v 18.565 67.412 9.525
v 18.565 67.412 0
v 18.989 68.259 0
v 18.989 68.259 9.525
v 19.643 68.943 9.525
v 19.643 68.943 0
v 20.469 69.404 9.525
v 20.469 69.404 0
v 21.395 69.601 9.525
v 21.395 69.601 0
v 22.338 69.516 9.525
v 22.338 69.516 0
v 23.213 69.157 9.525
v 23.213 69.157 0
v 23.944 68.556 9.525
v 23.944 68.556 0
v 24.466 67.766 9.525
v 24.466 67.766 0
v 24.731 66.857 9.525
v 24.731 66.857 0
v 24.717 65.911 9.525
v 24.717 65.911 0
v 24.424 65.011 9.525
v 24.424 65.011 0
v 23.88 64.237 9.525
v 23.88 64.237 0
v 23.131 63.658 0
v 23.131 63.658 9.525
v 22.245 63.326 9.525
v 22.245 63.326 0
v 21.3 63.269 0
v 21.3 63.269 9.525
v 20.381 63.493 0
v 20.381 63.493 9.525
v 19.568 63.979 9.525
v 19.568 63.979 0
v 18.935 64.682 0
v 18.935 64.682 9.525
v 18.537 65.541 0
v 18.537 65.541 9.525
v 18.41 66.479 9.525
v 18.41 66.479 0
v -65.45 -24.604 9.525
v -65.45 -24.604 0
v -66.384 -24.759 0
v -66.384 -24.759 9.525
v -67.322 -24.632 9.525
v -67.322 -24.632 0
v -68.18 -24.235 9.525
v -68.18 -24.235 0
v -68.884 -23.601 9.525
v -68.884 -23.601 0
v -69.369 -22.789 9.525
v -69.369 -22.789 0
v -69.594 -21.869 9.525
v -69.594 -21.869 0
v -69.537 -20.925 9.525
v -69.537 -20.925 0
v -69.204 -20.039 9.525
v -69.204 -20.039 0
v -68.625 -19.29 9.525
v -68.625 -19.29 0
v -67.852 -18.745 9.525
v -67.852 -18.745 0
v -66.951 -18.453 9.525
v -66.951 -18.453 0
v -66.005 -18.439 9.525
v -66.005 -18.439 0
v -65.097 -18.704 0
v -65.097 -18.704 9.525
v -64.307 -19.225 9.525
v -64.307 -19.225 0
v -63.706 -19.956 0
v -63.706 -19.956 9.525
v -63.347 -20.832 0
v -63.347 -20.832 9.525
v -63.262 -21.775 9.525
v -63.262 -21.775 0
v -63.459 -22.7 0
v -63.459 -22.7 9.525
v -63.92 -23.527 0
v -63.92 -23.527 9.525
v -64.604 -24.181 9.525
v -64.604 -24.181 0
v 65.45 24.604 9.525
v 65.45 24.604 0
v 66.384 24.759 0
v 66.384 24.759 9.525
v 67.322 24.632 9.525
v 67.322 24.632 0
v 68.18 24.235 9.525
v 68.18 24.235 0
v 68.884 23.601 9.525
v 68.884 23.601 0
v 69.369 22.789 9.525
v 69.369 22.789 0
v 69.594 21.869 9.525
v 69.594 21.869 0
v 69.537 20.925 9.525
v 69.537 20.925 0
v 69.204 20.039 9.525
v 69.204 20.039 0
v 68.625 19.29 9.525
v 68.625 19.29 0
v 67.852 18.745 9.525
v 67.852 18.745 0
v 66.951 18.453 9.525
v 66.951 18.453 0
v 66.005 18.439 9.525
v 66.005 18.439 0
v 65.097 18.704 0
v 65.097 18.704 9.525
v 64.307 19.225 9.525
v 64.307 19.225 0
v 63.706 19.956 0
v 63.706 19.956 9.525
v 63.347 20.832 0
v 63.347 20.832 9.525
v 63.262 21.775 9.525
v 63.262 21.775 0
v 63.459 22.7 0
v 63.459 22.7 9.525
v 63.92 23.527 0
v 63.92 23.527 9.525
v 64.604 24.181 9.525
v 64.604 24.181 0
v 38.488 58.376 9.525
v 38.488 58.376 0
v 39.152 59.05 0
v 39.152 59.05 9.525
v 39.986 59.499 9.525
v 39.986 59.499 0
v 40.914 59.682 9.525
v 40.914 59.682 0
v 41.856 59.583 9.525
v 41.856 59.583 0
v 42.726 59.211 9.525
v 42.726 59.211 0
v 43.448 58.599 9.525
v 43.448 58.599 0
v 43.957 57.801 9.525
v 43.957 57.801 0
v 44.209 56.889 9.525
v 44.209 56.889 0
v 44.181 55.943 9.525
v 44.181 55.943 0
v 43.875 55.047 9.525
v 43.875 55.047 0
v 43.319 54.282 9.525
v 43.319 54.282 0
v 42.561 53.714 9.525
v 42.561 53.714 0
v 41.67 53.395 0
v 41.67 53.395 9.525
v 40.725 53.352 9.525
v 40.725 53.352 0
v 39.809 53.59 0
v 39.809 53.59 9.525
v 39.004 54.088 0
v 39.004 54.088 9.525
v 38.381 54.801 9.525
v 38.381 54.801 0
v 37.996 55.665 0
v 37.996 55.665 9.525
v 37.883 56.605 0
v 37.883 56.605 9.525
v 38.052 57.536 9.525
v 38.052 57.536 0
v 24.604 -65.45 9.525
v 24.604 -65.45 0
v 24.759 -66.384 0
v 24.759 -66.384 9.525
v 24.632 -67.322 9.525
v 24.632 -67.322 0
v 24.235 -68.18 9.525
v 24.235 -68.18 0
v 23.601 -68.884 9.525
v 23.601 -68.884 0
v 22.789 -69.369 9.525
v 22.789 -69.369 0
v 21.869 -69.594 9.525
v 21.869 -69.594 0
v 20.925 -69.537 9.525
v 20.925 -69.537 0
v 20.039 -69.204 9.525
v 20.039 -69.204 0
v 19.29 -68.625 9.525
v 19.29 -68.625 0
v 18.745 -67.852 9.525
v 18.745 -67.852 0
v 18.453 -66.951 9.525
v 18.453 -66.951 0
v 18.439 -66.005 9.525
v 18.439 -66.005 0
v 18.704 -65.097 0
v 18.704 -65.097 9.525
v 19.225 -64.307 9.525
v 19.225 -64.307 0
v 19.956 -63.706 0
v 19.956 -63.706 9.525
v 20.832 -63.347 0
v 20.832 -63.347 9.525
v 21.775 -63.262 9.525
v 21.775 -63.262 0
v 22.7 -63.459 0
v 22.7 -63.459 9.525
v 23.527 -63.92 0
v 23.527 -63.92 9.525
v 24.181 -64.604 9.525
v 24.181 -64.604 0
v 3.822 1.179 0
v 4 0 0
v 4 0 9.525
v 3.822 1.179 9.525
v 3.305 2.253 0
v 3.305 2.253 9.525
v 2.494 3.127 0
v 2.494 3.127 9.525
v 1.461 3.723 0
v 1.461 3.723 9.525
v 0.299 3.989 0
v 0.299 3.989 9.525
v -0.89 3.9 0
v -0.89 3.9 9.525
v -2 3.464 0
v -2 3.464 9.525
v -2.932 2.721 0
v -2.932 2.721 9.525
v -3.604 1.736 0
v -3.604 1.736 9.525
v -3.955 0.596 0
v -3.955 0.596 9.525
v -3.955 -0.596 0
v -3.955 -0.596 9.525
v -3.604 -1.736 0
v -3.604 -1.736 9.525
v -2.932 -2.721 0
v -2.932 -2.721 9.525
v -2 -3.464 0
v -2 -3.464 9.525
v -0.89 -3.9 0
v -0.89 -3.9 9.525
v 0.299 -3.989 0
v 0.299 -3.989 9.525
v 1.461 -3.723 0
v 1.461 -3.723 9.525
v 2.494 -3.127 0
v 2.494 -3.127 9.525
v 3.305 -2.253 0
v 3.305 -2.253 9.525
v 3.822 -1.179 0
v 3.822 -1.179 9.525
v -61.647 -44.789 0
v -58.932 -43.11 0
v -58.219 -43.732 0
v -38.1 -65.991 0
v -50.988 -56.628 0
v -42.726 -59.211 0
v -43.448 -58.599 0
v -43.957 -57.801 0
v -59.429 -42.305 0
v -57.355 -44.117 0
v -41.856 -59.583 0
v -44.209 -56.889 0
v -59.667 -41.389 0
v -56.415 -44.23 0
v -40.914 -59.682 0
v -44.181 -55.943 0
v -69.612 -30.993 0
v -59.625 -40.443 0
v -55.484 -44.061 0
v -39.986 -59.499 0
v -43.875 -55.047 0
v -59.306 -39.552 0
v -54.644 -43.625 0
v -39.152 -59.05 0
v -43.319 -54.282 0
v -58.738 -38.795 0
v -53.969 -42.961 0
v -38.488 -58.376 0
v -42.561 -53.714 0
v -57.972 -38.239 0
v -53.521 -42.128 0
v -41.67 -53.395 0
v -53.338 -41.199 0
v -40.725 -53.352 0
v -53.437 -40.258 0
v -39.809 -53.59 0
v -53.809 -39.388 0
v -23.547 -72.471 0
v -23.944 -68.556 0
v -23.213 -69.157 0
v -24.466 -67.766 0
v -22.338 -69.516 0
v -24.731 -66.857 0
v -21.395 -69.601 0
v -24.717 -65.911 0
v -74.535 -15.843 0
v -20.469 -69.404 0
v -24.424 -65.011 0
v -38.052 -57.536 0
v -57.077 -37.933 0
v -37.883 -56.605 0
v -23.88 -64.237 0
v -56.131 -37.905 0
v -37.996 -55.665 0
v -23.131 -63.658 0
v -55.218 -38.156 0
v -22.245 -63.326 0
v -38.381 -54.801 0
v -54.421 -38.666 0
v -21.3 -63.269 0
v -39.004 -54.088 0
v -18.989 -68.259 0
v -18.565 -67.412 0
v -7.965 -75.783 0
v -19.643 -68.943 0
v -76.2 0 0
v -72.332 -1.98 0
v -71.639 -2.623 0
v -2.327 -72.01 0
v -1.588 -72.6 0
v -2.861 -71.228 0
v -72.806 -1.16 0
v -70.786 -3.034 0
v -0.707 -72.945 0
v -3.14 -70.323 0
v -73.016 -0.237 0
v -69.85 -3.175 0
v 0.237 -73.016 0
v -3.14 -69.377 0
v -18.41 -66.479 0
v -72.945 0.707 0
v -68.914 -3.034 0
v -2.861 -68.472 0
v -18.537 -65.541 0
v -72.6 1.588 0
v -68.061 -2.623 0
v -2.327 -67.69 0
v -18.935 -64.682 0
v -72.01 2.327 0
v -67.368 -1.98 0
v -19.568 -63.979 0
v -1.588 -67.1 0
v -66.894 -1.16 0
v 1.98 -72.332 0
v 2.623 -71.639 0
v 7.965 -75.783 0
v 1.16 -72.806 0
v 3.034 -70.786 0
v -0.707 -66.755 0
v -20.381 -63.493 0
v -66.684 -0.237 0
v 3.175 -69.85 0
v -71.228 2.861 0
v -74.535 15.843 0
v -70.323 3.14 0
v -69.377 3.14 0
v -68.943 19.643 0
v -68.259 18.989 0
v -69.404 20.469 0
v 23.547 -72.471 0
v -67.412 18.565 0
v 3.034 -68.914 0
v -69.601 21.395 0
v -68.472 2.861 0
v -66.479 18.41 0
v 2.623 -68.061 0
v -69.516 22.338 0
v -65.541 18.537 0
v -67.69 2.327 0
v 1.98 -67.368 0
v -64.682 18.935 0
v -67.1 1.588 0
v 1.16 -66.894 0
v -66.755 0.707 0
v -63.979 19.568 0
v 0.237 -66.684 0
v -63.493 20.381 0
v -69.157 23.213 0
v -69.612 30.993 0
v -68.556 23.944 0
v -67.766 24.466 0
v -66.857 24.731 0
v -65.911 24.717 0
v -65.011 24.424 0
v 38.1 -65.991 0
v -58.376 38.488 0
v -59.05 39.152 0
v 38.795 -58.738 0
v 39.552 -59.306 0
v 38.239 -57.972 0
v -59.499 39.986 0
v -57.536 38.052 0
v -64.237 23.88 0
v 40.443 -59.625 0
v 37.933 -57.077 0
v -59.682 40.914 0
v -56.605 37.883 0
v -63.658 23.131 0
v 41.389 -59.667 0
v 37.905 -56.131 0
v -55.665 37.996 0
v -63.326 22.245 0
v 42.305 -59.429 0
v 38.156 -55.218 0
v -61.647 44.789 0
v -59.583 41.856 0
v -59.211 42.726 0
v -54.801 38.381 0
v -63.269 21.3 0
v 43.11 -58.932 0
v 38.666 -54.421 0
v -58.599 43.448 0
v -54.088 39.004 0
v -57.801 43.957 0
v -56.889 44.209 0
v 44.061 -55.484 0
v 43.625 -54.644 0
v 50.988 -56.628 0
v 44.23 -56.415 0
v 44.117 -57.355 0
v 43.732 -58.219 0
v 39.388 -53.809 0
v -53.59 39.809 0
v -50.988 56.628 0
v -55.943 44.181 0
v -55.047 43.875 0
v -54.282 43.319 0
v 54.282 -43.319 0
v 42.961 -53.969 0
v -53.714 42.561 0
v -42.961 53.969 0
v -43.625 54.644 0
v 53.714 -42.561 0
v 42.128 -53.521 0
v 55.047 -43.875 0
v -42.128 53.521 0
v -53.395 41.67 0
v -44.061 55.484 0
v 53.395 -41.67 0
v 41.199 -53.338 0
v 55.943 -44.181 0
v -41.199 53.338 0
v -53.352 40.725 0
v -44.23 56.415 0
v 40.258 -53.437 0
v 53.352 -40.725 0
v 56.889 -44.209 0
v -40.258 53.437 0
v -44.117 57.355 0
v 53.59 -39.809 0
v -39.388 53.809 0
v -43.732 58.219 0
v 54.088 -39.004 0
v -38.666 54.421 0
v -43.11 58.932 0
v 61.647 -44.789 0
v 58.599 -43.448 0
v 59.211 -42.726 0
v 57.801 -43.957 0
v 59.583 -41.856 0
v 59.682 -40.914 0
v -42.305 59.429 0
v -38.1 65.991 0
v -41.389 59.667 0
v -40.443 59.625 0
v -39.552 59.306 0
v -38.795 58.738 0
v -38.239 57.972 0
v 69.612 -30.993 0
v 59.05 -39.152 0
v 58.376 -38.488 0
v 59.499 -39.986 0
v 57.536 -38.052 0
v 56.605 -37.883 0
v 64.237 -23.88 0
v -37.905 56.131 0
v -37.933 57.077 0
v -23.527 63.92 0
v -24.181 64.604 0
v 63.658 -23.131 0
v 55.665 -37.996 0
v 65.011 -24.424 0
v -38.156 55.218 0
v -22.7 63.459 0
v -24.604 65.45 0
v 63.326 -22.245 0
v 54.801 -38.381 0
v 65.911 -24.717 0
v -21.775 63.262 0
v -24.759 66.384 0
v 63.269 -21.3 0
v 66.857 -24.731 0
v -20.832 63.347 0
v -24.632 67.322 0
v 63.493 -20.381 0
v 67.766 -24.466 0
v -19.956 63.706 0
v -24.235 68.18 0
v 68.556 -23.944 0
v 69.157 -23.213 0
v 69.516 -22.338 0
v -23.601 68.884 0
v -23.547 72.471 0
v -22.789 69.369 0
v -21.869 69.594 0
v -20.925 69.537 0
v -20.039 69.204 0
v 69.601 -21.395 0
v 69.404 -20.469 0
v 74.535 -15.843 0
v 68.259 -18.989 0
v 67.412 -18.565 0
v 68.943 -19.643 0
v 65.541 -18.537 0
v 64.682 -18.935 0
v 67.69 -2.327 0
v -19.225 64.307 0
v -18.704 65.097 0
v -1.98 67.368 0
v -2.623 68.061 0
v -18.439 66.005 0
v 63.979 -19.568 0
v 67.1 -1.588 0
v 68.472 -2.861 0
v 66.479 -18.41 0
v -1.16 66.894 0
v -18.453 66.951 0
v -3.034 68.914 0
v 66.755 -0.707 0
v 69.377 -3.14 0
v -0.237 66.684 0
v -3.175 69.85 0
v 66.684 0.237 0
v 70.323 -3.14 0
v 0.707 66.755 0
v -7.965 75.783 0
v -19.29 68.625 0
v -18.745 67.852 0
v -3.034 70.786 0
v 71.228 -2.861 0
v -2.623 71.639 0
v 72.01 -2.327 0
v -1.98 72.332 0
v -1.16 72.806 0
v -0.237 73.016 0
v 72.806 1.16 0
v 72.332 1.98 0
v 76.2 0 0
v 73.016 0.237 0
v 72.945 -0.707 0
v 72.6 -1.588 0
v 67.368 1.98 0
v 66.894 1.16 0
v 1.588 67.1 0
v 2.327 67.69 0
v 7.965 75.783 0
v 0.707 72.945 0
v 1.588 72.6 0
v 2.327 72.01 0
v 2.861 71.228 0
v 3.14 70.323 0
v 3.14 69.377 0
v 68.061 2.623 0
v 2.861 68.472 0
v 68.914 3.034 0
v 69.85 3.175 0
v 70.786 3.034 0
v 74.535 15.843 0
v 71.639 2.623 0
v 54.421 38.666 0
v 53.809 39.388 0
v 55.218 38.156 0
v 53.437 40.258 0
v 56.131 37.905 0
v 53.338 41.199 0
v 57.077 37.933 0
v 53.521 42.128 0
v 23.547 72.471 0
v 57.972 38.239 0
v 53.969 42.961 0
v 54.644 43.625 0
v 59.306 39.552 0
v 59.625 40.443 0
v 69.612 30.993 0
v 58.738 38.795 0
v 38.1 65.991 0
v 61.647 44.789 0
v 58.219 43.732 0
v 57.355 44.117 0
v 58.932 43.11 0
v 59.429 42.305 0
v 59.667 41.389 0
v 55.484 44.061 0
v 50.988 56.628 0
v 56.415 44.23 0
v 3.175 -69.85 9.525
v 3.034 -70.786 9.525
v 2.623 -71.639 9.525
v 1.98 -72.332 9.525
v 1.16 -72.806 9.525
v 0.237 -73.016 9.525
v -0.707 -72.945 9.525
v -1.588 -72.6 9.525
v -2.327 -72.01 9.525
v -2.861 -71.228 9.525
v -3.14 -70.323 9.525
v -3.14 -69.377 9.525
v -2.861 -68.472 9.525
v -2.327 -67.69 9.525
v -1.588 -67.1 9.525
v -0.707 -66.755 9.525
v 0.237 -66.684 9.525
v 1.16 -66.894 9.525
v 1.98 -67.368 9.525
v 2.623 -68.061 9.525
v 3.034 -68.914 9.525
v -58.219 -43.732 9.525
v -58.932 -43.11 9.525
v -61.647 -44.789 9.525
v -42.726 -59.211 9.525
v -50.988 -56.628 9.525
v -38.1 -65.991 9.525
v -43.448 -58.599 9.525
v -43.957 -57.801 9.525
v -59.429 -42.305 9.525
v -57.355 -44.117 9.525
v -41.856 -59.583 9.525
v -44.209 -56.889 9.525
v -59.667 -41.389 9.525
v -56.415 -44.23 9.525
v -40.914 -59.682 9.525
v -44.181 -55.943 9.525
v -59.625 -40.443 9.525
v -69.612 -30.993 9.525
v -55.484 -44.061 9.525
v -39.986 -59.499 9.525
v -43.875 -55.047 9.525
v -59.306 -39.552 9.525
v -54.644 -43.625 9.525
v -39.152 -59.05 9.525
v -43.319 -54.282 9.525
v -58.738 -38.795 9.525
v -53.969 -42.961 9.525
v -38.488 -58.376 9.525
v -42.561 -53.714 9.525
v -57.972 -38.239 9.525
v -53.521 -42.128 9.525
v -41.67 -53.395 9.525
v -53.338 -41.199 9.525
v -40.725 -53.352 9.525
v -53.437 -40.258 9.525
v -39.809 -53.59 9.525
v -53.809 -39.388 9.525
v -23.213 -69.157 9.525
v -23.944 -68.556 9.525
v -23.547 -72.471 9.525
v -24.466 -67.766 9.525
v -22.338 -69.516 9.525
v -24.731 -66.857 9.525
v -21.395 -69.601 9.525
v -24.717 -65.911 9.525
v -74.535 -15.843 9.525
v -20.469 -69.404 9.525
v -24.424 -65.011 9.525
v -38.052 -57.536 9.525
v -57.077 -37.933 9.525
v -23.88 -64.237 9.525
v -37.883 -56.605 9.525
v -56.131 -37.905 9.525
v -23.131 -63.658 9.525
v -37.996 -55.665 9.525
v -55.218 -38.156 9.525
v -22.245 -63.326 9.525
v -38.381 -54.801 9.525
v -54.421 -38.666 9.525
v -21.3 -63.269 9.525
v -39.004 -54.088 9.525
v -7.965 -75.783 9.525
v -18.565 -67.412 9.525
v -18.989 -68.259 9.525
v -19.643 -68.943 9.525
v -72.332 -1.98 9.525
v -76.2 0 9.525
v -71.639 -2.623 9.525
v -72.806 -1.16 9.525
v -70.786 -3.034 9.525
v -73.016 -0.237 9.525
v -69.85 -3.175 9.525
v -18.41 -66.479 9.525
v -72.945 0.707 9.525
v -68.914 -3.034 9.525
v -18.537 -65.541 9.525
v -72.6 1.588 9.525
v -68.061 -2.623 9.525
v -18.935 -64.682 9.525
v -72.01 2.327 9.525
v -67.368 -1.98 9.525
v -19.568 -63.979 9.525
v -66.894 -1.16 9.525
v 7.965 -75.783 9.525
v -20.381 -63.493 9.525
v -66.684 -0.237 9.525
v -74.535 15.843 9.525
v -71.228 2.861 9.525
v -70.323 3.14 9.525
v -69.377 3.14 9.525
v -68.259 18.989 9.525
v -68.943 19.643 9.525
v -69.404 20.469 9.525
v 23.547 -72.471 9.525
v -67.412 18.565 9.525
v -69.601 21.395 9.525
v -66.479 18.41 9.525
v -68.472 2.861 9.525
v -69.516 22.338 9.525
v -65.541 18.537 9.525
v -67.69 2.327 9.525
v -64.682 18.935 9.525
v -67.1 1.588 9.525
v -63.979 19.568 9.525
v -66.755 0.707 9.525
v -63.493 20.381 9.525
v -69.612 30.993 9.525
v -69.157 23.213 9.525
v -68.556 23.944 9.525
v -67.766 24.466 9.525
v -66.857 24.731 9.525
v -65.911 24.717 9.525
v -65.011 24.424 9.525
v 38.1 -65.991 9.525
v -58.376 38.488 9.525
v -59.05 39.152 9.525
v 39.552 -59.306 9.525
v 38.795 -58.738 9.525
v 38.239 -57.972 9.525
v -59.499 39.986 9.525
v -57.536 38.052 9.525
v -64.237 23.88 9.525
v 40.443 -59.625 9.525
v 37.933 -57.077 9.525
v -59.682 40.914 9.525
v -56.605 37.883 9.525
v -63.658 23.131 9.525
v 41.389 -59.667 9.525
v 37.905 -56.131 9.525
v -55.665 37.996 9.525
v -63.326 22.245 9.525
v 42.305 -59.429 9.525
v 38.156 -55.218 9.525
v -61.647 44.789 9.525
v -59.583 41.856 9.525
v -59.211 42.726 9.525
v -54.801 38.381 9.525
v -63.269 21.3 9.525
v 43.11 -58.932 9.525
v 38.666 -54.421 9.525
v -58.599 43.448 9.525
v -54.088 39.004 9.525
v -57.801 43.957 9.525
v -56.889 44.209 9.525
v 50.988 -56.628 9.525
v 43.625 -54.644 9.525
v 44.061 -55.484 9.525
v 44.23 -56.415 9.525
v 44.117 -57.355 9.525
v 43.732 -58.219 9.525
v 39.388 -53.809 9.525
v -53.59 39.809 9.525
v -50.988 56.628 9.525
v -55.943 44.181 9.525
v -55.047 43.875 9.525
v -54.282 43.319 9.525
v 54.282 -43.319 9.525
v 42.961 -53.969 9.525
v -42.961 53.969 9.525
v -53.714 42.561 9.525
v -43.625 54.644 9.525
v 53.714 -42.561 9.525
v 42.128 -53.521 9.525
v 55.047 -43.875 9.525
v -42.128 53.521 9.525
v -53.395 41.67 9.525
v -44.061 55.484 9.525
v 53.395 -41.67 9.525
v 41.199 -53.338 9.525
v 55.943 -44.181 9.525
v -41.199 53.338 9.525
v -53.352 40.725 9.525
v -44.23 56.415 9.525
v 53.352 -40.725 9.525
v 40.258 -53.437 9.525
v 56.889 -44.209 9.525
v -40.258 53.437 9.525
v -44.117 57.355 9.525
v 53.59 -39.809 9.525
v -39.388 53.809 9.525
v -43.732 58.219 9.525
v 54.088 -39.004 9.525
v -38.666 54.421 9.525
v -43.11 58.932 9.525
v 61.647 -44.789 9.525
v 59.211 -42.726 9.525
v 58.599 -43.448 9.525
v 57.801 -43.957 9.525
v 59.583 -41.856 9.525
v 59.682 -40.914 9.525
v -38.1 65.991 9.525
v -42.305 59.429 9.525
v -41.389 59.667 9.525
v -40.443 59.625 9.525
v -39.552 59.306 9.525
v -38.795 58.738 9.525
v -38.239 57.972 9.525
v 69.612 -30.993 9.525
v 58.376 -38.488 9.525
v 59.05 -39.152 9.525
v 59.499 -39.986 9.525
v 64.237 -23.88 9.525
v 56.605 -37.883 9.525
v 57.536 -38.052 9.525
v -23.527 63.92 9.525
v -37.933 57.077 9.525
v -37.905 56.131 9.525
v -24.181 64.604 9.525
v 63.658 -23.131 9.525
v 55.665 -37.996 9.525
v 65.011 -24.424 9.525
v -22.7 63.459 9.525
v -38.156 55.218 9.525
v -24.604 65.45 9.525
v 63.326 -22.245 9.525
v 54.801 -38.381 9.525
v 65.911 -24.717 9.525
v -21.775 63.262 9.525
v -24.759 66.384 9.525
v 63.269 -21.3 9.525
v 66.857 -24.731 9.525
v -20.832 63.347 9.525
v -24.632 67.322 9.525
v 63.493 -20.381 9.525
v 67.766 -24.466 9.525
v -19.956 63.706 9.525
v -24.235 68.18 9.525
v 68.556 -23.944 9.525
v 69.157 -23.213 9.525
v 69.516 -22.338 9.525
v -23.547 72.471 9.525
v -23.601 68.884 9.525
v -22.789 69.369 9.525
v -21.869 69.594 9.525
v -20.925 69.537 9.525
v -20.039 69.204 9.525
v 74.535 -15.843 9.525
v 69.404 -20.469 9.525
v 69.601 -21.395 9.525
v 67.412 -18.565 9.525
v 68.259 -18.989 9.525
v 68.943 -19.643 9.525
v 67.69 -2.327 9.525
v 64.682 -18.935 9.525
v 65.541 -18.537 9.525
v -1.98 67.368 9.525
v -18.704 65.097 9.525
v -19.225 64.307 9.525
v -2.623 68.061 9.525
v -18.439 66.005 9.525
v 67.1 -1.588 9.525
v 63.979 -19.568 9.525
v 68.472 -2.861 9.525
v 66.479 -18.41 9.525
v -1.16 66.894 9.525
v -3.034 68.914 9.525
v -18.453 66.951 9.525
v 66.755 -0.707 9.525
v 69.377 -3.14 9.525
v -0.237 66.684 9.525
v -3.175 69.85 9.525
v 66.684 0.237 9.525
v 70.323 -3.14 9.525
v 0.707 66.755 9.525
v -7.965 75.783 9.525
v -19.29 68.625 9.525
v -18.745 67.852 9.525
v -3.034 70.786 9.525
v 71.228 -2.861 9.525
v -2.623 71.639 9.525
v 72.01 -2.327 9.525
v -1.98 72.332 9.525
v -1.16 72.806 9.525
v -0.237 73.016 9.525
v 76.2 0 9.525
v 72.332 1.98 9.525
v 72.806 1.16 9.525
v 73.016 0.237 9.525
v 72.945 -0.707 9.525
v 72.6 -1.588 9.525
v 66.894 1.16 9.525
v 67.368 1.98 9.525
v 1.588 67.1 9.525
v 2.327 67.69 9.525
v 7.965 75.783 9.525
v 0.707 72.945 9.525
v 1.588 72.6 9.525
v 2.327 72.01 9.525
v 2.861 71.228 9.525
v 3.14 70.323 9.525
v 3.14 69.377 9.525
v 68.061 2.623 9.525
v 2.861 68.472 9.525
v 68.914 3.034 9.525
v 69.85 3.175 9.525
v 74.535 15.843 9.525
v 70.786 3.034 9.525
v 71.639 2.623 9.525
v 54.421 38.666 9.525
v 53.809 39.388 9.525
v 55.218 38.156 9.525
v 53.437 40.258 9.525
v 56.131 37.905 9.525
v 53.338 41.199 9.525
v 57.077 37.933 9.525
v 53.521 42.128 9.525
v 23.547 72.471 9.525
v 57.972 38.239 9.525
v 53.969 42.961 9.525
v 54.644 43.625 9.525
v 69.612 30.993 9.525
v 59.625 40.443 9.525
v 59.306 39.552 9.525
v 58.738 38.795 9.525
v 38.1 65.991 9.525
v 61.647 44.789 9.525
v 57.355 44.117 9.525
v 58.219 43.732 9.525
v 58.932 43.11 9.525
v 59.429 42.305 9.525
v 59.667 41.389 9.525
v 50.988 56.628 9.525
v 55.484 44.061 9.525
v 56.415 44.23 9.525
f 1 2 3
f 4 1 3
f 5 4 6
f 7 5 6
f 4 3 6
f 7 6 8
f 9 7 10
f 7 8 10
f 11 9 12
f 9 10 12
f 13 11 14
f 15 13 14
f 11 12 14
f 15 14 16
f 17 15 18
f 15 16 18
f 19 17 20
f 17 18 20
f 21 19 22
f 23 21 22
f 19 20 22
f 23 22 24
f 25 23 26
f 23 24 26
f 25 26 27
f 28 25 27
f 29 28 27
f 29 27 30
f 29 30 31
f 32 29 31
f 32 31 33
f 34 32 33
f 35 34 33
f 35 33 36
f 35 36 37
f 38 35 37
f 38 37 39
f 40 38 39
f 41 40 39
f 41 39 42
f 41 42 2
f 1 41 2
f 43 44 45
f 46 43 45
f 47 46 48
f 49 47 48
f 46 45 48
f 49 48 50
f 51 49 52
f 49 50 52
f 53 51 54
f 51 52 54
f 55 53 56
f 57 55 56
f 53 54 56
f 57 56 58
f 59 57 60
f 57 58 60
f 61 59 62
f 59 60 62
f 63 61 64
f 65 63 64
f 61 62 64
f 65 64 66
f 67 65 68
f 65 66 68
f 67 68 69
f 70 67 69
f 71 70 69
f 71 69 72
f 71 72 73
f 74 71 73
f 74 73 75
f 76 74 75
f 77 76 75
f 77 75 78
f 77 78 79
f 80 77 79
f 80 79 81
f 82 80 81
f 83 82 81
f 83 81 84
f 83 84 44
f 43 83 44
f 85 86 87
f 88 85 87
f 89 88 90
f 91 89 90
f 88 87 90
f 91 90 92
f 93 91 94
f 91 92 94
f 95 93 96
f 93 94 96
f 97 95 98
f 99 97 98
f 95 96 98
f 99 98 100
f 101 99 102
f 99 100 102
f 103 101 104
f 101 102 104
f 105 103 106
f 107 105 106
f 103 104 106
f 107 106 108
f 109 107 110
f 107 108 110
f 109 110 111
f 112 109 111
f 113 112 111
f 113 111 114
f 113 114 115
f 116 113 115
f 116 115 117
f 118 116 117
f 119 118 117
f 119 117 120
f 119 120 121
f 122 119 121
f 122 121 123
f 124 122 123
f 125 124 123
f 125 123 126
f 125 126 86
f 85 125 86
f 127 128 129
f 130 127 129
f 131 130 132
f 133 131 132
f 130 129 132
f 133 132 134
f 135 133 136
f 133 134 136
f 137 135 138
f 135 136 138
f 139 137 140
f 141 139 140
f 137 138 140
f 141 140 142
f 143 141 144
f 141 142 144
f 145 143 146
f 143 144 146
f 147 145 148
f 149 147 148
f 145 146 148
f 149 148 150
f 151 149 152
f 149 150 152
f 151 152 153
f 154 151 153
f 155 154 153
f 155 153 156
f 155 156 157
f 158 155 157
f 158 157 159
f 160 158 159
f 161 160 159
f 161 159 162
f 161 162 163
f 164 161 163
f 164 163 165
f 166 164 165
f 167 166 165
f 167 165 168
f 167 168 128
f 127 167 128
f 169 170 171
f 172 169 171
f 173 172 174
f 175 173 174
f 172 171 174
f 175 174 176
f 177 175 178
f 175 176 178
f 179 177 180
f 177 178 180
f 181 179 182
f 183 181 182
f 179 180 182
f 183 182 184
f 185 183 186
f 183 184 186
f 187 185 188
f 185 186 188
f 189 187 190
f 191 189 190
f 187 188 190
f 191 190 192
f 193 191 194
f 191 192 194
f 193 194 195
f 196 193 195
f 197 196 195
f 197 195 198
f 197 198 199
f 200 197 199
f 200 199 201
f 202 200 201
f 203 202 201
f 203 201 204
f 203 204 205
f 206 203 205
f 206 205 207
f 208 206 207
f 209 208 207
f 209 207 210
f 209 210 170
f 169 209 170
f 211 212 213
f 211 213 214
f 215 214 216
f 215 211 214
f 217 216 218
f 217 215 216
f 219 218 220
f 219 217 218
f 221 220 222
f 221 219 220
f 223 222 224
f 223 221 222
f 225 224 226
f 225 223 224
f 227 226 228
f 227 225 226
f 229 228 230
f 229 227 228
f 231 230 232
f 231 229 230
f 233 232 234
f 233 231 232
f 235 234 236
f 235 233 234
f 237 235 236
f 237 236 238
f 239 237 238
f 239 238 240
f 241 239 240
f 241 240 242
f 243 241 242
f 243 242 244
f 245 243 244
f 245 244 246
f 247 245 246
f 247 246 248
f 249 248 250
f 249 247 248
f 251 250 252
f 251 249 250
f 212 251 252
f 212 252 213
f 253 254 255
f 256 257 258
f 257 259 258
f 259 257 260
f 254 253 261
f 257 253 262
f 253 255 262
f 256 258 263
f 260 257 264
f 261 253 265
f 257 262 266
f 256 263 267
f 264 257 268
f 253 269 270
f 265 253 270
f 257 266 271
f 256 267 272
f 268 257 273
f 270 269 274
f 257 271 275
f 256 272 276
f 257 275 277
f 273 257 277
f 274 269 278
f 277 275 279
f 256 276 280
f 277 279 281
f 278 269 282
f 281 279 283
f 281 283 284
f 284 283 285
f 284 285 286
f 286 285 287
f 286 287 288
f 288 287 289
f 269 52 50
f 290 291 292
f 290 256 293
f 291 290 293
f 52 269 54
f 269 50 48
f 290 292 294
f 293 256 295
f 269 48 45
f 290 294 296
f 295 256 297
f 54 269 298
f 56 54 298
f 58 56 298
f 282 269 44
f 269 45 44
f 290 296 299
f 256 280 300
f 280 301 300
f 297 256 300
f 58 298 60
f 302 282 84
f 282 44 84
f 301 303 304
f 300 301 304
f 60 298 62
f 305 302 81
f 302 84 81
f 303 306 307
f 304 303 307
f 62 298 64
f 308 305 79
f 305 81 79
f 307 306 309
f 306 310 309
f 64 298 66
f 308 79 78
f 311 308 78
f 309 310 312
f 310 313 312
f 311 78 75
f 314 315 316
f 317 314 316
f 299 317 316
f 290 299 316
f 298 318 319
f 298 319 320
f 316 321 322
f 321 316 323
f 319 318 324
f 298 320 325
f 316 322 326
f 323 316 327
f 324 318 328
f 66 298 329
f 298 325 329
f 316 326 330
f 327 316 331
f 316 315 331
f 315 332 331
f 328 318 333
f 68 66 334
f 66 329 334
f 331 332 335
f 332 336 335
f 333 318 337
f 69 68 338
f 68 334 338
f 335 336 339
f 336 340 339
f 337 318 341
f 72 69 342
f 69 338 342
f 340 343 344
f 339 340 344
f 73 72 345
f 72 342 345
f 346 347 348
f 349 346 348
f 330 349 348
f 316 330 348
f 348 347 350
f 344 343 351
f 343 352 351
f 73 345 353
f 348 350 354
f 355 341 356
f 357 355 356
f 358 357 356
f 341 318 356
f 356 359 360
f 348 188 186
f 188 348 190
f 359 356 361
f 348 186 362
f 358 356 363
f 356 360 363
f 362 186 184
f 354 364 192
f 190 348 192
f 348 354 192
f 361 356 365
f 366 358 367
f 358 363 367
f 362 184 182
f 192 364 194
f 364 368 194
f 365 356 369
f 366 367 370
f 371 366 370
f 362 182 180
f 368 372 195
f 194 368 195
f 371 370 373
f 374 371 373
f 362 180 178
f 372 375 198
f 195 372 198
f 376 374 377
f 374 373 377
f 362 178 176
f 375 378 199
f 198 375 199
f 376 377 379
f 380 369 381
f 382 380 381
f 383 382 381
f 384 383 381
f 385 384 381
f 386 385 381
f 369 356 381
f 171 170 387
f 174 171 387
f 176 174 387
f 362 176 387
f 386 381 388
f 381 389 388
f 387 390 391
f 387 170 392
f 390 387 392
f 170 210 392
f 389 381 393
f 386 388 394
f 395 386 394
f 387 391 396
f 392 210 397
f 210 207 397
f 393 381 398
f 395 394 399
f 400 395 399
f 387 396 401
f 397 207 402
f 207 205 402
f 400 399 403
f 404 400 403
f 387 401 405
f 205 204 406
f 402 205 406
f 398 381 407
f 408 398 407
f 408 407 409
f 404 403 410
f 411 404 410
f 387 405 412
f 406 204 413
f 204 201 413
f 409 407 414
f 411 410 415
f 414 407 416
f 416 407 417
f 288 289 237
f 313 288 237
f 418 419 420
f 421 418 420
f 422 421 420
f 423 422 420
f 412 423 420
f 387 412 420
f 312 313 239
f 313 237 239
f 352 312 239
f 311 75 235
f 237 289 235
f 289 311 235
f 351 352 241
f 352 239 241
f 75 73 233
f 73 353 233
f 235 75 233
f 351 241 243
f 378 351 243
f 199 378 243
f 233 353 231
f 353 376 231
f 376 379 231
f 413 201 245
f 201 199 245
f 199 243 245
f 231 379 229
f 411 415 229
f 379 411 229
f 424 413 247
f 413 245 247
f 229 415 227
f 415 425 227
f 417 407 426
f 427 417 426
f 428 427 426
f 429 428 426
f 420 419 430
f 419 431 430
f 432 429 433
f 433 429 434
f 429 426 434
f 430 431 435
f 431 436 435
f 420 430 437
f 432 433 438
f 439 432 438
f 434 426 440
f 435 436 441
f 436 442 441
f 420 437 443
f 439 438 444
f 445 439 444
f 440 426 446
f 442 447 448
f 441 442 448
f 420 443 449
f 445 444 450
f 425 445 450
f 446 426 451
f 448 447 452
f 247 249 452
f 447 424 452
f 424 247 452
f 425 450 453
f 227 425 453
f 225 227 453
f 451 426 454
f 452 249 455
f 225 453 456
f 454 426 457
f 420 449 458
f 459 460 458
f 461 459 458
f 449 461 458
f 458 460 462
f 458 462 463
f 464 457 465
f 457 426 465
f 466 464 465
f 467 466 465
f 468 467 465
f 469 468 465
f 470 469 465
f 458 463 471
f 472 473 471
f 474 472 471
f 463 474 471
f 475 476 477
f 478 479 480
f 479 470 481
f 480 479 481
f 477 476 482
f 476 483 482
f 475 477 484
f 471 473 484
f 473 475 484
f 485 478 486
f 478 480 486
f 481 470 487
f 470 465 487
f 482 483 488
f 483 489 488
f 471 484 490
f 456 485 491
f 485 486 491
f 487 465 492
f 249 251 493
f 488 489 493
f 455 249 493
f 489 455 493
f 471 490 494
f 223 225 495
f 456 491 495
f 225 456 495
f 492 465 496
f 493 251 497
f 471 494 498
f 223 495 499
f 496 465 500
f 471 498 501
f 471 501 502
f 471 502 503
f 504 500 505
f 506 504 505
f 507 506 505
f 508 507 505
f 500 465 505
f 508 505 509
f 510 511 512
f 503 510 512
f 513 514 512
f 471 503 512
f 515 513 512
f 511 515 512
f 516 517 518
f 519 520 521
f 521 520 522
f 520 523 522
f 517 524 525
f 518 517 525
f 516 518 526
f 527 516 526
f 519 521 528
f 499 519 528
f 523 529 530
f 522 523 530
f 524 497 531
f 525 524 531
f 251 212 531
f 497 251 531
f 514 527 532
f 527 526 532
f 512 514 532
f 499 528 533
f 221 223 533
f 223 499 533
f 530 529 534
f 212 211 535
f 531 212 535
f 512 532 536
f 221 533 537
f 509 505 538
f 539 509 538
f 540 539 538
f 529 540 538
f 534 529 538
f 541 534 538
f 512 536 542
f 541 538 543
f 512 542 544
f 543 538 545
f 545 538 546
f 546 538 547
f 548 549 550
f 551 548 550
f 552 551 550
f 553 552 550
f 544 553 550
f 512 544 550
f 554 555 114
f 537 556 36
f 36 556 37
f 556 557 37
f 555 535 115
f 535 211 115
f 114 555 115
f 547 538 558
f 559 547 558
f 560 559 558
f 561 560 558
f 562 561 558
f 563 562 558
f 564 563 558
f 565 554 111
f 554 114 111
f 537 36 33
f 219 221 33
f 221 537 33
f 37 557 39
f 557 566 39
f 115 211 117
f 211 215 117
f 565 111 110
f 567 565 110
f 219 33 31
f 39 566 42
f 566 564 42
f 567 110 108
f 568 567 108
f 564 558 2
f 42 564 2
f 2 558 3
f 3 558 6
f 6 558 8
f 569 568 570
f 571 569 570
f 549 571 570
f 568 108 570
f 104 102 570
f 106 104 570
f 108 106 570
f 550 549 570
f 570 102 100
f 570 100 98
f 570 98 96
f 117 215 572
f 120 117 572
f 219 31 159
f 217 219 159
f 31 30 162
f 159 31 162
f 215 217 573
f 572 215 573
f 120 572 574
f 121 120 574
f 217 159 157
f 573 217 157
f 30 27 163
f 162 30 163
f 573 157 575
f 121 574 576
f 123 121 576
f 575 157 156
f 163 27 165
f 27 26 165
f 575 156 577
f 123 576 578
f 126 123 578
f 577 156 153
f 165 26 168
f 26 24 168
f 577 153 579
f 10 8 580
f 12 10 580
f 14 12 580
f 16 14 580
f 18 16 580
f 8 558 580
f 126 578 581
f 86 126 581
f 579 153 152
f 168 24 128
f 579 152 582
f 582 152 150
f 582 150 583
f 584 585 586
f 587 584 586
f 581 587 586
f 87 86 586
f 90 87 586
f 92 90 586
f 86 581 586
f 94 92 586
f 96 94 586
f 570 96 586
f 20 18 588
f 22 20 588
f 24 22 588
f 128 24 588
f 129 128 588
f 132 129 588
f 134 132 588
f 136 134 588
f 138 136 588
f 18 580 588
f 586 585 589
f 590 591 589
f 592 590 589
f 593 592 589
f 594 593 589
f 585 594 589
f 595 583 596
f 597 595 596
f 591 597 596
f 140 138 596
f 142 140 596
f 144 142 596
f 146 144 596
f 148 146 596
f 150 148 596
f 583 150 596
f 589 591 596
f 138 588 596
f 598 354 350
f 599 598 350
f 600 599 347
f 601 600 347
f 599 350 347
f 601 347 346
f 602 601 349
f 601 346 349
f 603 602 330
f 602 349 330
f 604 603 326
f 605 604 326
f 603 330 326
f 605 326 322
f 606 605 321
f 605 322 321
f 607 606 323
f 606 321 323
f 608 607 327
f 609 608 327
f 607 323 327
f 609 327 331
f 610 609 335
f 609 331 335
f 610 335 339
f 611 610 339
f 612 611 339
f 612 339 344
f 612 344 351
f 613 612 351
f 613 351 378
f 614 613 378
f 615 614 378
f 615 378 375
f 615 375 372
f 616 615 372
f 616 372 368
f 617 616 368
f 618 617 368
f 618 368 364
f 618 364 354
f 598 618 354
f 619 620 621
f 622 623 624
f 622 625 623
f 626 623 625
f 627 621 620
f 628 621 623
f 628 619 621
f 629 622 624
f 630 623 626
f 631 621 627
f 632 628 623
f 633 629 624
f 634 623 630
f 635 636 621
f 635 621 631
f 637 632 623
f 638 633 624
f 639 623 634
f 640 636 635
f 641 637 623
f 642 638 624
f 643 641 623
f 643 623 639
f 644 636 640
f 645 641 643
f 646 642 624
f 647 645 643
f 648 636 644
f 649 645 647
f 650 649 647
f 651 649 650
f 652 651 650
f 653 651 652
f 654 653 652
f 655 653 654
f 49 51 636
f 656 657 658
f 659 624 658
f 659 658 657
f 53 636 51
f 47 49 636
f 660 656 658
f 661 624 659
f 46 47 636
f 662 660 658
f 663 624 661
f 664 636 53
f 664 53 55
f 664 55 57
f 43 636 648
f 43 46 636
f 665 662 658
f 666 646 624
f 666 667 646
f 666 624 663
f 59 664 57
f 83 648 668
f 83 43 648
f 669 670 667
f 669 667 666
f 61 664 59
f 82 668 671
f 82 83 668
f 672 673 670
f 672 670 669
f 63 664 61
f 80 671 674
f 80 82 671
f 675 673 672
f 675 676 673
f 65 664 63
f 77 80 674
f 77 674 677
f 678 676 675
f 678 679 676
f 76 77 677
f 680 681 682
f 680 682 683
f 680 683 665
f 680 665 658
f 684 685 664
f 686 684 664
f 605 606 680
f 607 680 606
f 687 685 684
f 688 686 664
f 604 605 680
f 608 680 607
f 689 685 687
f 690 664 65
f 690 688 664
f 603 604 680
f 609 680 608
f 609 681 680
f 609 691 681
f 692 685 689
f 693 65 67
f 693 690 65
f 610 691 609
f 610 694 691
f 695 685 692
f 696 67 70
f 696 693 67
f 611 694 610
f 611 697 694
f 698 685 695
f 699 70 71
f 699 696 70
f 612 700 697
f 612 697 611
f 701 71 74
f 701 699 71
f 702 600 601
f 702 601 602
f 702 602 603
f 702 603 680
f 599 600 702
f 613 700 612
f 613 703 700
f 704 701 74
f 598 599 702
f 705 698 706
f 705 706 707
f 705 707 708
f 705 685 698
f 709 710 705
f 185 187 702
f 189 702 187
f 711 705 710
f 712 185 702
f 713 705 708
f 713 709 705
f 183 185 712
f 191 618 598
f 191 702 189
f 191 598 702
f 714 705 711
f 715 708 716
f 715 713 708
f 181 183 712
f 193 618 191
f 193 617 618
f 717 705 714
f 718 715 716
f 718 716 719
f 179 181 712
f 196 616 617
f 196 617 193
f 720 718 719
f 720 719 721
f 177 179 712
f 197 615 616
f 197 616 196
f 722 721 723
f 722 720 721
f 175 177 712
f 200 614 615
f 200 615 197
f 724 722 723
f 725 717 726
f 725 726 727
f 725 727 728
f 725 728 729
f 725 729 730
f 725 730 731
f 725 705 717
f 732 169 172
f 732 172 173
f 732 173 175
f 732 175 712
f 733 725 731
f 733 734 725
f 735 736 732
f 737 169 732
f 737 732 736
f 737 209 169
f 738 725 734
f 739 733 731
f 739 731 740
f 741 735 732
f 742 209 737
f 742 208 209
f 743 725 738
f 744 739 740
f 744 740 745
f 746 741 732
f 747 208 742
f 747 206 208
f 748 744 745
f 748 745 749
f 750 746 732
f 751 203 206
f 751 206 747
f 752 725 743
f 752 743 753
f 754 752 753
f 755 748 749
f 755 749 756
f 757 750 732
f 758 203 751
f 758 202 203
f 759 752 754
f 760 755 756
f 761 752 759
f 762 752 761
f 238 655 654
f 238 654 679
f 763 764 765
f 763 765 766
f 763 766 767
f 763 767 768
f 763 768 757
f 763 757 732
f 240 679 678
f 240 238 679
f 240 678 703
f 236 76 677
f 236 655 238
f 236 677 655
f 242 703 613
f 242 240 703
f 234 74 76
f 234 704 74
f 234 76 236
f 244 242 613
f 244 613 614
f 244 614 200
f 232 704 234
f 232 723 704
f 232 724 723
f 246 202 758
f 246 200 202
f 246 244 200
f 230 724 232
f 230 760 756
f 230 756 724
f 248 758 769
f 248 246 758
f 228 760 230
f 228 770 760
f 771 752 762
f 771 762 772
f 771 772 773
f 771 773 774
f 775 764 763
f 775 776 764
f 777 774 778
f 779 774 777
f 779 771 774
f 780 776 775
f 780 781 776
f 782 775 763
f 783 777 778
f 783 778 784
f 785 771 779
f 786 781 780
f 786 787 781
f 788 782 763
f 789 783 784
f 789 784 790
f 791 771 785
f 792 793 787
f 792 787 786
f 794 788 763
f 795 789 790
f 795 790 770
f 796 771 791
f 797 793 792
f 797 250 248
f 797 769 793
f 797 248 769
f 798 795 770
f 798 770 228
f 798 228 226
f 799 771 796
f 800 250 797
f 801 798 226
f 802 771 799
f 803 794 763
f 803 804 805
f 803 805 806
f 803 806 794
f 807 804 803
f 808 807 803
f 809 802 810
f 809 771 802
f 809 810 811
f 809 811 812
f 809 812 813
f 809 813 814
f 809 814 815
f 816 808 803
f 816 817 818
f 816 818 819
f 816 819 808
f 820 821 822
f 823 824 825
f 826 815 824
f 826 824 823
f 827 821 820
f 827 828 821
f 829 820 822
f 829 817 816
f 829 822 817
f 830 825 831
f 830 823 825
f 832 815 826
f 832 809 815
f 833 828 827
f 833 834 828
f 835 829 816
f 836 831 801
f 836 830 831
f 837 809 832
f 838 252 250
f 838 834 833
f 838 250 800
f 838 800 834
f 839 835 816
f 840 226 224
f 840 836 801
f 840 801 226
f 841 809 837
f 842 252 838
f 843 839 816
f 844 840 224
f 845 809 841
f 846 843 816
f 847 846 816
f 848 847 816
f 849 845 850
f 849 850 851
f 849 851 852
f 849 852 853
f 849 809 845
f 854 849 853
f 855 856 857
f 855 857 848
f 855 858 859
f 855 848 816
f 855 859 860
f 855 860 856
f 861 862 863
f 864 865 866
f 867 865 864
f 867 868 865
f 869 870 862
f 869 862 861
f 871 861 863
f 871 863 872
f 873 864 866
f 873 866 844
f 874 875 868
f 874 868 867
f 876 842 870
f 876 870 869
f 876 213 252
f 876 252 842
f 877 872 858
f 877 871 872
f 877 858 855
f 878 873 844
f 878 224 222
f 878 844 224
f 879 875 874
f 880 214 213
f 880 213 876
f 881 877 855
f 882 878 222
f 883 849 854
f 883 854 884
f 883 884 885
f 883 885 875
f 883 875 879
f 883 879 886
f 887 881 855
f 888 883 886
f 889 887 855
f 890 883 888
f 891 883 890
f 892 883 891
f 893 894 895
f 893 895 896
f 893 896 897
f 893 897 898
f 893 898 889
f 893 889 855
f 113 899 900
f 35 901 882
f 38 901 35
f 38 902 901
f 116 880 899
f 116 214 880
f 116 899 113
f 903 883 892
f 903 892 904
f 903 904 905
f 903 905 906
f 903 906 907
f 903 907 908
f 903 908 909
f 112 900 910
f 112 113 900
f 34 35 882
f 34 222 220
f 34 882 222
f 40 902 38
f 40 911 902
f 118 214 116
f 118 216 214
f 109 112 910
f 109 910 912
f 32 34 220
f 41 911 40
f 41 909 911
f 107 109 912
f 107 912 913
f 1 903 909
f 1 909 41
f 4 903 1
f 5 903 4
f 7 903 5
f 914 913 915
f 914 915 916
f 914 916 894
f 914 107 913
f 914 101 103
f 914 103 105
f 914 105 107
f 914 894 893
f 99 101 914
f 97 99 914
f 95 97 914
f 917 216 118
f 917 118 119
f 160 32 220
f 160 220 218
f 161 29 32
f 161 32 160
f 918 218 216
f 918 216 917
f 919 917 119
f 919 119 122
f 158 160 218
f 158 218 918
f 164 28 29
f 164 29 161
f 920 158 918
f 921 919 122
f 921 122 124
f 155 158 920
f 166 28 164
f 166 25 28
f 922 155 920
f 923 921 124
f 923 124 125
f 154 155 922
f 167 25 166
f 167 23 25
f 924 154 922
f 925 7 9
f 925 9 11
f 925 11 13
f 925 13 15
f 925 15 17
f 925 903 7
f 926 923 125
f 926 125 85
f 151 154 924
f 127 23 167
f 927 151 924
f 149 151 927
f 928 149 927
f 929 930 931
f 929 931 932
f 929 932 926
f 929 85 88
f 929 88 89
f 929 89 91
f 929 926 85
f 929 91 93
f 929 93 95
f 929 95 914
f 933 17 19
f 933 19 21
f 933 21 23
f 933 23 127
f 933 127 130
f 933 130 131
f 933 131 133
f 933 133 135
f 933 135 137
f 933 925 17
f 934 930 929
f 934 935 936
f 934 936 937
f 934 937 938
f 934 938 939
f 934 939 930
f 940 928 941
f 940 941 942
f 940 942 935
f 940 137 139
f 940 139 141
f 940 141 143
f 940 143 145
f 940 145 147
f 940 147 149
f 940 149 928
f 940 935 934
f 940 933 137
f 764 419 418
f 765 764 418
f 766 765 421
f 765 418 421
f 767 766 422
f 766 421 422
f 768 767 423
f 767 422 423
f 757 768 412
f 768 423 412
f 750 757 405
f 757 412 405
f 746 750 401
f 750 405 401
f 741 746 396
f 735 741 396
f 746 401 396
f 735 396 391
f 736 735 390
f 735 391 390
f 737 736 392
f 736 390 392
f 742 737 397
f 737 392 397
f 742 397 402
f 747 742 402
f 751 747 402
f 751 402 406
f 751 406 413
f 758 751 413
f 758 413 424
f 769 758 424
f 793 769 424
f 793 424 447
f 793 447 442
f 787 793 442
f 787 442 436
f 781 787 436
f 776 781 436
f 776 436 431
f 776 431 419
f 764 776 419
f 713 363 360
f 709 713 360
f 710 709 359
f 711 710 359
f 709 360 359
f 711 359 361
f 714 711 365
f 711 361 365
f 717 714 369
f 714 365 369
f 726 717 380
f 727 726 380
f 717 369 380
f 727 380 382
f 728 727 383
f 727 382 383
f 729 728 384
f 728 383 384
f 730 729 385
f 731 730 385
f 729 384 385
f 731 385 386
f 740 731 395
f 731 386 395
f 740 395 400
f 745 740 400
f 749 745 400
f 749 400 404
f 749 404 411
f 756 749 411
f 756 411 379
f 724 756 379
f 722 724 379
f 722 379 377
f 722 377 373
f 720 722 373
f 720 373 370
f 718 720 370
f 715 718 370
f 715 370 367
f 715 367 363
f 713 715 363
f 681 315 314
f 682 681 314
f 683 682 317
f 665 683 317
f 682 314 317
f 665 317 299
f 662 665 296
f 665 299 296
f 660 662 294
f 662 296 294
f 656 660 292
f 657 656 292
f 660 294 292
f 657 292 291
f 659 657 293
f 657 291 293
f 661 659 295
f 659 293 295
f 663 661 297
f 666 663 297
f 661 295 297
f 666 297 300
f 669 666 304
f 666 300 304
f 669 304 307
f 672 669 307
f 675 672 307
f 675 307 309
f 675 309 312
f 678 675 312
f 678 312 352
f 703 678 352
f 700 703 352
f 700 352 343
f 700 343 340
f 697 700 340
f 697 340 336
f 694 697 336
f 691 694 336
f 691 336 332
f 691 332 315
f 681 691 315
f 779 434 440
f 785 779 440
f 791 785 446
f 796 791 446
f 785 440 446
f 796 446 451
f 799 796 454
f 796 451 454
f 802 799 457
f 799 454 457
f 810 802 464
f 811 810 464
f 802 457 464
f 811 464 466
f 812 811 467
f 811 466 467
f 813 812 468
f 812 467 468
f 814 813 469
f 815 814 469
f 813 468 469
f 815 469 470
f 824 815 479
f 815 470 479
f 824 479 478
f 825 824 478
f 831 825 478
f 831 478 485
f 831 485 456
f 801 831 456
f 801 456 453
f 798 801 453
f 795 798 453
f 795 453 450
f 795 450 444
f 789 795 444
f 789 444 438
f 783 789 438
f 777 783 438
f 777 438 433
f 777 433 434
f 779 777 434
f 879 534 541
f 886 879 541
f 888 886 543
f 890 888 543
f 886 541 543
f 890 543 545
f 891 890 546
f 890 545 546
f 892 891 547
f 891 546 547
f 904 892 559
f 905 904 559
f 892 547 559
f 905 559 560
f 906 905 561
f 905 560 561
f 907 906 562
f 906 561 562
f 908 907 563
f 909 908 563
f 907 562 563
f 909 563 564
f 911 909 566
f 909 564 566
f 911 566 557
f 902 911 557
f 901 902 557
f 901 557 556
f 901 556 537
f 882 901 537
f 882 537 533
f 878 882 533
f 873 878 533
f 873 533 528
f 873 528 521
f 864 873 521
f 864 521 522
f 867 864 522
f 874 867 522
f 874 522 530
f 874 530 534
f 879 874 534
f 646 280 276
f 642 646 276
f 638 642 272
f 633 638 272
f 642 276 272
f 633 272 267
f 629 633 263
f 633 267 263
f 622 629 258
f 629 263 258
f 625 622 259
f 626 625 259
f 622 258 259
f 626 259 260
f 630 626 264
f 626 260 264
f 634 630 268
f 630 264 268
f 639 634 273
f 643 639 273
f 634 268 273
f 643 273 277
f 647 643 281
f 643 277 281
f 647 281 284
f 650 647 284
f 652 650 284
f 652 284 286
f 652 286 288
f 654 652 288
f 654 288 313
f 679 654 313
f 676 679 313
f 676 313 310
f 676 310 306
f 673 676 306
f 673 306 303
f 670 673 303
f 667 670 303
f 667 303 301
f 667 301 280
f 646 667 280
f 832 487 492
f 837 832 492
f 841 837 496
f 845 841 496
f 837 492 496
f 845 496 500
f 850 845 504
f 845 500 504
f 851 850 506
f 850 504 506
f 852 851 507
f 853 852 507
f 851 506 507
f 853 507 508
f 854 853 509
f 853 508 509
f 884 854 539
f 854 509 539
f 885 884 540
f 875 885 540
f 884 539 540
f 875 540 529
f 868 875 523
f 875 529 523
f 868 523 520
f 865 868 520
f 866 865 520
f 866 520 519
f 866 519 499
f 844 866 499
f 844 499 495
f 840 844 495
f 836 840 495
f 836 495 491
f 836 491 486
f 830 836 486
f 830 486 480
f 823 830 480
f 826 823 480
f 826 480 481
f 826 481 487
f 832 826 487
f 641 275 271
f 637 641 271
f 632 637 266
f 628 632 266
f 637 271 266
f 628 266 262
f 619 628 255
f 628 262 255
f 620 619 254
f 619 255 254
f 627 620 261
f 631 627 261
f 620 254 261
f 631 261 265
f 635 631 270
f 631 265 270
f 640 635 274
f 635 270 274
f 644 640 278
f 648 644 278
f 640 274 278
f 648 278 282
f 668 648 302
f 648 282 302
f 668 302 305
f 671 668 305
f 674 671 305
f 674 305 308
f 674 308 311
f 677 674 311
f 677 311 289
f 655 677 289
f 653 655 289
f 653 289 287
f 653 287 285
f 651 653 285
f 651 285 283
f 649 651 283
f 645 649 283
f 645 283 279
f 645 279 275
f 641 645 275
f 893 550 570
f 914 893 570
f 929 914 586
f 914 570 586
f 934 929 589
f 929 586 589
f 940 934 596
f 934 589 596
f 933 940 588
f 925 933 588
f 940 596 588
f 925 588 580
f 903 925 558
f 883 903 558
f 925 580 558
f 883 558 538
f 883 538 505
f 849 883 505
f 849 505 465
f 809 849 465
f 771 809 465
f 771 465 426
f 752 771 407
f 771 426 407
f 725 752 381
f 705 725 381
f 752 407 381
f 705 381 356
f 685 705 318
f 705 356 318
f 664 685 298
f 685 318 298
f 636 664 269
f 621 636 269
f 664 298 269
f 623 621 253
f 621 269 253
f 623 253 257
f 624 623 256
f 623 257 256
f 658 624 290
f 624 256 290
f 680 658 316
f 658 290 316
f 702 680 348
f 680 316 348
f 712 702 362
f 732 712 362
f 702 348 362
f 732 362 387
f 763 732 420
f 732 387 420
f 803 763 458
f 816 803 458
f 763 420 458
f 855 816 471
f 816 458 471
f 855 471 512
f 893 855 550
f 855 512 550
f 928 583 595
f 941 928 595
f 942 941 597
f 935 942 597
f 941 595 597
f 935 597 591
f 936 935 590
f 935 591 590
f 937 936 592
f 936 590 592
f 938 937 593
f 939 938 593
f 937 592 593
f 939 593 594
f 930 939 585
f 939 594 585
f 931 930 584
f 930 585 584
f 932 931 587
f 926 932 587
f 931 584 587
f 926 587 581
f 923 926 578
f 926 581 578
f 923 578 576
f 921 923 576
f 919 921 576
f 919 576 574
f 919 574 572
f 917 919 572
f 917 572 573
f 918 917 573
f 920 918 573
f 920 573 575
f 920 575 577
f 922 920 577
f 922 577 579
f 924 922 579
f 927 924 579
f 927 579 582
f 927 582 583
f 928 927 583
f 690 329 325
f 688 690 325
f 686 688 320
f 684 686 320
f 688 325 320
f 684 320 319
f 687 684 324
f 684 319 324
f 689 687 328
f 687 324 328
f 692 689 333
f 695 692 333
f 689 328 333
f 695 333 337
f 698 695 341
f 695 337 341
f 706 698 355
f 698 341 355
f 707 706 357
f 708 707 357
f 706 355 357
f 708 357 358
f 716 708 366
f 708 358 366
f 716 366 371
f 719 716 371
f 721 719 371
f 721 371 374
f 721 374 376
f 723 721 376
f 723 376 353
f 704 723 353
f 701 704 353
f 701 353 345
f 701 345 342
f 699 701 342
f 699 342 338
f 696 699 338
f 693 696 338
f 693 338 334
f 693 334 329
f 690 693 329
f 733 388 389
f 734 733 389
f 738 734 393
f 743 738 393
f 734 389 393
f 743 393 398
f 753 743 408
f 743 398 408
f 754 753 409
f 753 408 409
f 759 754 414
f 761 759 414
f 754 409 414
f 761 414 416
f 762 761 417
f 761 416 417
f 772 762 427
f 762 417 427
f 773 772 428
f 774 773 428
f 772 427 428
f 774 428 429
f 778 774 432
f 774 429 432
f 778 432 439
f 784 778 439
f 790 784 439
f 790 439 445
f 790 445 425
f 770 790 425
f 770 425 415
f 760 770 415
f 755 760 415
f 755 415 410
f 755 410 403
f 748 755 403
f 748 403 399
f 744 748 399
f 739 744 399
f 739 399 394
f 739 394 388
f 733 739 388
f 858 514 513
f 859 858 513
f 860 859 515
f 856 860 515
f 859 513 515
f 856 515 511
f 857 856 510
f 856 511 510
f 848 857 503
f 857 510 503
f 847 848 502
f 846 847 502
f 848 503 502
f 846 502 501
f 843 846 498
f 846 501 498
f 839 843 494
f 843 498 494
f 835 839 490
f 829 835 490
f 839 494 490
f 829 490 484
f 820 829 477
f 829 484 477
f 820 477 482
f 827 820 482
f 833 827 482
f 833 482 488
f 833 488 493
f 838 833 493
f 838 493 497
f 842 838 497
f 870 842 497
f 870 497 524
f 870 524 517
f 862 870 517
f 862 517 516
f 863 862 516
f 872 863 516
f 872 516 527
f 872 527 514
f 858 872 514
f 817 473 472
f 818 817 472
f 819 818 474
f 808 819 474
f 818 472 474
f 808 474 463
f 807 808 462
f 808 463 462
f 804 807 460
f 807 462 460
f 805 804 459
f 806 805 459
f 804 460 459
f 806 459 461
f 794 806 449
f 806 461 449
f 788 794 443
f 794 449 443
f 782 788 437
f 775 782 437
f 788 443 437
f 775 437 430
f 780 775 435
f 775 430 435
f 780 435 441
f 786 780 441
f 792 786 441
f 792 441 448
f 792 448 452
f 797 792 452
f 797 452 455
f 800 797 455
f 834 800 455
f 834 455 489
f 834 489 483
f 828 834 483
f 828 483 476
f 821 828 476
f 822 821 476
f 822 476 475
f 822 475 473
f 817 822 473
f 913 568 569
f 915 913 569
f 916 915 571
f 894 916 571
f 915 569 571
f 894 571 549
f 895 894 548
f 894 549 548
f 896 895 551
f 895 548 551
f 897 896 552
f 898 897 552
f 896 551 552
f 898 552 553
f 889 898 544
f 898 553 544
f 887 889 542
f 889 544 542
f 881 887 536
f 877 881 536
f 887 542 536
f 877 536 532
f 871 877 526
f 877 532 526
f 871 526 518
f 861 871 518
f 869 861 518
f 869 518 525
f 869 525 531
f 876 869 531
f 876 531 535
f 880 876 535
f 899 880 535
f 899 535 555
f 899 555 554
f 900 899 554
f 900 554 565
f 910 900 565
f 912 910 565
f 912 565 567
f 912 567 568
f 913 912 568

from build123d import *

# Parameters (mm, degrees)
F0_R            = 76.2
F0_R_2          = 4
F1_DEPTH        = 9.525
F3_D            = 6.35
F3_COPIES_COUNT = 20


# Not quite as in the source:
# - a pattern or mirror of a feature is missing from the dataset's text; its kind, count and spacing are read off the source's solid


with BuildPart() as f1:
    # F0 (on Top) → F1 (new body)
    with BuildSketch(Plane.XY):
        Circle(F0_R)
        Circle(F0_R_2, mode=Mode.SUBTRACT)
    extrude(amount=F1_DEPTH)

    # F3 (through all)
    with Locations(Plane.XY.offset(9.525)):
        with Locations((0, 69.85)):
            f3 = Hole(F3_D / 2)

    # F3_copies: F3 ×20 about axis
    f3_copies_axis = Axis((0, 0, 0), (0, 0, 1))
    for i in range(1, F3_COPIES_COUNT):
        add(f3.rotate(f3_copies_axis, i * 360 / F3_COPIES_COUNT), mode=Mode.SUBTRACT)


solid = f1.part
